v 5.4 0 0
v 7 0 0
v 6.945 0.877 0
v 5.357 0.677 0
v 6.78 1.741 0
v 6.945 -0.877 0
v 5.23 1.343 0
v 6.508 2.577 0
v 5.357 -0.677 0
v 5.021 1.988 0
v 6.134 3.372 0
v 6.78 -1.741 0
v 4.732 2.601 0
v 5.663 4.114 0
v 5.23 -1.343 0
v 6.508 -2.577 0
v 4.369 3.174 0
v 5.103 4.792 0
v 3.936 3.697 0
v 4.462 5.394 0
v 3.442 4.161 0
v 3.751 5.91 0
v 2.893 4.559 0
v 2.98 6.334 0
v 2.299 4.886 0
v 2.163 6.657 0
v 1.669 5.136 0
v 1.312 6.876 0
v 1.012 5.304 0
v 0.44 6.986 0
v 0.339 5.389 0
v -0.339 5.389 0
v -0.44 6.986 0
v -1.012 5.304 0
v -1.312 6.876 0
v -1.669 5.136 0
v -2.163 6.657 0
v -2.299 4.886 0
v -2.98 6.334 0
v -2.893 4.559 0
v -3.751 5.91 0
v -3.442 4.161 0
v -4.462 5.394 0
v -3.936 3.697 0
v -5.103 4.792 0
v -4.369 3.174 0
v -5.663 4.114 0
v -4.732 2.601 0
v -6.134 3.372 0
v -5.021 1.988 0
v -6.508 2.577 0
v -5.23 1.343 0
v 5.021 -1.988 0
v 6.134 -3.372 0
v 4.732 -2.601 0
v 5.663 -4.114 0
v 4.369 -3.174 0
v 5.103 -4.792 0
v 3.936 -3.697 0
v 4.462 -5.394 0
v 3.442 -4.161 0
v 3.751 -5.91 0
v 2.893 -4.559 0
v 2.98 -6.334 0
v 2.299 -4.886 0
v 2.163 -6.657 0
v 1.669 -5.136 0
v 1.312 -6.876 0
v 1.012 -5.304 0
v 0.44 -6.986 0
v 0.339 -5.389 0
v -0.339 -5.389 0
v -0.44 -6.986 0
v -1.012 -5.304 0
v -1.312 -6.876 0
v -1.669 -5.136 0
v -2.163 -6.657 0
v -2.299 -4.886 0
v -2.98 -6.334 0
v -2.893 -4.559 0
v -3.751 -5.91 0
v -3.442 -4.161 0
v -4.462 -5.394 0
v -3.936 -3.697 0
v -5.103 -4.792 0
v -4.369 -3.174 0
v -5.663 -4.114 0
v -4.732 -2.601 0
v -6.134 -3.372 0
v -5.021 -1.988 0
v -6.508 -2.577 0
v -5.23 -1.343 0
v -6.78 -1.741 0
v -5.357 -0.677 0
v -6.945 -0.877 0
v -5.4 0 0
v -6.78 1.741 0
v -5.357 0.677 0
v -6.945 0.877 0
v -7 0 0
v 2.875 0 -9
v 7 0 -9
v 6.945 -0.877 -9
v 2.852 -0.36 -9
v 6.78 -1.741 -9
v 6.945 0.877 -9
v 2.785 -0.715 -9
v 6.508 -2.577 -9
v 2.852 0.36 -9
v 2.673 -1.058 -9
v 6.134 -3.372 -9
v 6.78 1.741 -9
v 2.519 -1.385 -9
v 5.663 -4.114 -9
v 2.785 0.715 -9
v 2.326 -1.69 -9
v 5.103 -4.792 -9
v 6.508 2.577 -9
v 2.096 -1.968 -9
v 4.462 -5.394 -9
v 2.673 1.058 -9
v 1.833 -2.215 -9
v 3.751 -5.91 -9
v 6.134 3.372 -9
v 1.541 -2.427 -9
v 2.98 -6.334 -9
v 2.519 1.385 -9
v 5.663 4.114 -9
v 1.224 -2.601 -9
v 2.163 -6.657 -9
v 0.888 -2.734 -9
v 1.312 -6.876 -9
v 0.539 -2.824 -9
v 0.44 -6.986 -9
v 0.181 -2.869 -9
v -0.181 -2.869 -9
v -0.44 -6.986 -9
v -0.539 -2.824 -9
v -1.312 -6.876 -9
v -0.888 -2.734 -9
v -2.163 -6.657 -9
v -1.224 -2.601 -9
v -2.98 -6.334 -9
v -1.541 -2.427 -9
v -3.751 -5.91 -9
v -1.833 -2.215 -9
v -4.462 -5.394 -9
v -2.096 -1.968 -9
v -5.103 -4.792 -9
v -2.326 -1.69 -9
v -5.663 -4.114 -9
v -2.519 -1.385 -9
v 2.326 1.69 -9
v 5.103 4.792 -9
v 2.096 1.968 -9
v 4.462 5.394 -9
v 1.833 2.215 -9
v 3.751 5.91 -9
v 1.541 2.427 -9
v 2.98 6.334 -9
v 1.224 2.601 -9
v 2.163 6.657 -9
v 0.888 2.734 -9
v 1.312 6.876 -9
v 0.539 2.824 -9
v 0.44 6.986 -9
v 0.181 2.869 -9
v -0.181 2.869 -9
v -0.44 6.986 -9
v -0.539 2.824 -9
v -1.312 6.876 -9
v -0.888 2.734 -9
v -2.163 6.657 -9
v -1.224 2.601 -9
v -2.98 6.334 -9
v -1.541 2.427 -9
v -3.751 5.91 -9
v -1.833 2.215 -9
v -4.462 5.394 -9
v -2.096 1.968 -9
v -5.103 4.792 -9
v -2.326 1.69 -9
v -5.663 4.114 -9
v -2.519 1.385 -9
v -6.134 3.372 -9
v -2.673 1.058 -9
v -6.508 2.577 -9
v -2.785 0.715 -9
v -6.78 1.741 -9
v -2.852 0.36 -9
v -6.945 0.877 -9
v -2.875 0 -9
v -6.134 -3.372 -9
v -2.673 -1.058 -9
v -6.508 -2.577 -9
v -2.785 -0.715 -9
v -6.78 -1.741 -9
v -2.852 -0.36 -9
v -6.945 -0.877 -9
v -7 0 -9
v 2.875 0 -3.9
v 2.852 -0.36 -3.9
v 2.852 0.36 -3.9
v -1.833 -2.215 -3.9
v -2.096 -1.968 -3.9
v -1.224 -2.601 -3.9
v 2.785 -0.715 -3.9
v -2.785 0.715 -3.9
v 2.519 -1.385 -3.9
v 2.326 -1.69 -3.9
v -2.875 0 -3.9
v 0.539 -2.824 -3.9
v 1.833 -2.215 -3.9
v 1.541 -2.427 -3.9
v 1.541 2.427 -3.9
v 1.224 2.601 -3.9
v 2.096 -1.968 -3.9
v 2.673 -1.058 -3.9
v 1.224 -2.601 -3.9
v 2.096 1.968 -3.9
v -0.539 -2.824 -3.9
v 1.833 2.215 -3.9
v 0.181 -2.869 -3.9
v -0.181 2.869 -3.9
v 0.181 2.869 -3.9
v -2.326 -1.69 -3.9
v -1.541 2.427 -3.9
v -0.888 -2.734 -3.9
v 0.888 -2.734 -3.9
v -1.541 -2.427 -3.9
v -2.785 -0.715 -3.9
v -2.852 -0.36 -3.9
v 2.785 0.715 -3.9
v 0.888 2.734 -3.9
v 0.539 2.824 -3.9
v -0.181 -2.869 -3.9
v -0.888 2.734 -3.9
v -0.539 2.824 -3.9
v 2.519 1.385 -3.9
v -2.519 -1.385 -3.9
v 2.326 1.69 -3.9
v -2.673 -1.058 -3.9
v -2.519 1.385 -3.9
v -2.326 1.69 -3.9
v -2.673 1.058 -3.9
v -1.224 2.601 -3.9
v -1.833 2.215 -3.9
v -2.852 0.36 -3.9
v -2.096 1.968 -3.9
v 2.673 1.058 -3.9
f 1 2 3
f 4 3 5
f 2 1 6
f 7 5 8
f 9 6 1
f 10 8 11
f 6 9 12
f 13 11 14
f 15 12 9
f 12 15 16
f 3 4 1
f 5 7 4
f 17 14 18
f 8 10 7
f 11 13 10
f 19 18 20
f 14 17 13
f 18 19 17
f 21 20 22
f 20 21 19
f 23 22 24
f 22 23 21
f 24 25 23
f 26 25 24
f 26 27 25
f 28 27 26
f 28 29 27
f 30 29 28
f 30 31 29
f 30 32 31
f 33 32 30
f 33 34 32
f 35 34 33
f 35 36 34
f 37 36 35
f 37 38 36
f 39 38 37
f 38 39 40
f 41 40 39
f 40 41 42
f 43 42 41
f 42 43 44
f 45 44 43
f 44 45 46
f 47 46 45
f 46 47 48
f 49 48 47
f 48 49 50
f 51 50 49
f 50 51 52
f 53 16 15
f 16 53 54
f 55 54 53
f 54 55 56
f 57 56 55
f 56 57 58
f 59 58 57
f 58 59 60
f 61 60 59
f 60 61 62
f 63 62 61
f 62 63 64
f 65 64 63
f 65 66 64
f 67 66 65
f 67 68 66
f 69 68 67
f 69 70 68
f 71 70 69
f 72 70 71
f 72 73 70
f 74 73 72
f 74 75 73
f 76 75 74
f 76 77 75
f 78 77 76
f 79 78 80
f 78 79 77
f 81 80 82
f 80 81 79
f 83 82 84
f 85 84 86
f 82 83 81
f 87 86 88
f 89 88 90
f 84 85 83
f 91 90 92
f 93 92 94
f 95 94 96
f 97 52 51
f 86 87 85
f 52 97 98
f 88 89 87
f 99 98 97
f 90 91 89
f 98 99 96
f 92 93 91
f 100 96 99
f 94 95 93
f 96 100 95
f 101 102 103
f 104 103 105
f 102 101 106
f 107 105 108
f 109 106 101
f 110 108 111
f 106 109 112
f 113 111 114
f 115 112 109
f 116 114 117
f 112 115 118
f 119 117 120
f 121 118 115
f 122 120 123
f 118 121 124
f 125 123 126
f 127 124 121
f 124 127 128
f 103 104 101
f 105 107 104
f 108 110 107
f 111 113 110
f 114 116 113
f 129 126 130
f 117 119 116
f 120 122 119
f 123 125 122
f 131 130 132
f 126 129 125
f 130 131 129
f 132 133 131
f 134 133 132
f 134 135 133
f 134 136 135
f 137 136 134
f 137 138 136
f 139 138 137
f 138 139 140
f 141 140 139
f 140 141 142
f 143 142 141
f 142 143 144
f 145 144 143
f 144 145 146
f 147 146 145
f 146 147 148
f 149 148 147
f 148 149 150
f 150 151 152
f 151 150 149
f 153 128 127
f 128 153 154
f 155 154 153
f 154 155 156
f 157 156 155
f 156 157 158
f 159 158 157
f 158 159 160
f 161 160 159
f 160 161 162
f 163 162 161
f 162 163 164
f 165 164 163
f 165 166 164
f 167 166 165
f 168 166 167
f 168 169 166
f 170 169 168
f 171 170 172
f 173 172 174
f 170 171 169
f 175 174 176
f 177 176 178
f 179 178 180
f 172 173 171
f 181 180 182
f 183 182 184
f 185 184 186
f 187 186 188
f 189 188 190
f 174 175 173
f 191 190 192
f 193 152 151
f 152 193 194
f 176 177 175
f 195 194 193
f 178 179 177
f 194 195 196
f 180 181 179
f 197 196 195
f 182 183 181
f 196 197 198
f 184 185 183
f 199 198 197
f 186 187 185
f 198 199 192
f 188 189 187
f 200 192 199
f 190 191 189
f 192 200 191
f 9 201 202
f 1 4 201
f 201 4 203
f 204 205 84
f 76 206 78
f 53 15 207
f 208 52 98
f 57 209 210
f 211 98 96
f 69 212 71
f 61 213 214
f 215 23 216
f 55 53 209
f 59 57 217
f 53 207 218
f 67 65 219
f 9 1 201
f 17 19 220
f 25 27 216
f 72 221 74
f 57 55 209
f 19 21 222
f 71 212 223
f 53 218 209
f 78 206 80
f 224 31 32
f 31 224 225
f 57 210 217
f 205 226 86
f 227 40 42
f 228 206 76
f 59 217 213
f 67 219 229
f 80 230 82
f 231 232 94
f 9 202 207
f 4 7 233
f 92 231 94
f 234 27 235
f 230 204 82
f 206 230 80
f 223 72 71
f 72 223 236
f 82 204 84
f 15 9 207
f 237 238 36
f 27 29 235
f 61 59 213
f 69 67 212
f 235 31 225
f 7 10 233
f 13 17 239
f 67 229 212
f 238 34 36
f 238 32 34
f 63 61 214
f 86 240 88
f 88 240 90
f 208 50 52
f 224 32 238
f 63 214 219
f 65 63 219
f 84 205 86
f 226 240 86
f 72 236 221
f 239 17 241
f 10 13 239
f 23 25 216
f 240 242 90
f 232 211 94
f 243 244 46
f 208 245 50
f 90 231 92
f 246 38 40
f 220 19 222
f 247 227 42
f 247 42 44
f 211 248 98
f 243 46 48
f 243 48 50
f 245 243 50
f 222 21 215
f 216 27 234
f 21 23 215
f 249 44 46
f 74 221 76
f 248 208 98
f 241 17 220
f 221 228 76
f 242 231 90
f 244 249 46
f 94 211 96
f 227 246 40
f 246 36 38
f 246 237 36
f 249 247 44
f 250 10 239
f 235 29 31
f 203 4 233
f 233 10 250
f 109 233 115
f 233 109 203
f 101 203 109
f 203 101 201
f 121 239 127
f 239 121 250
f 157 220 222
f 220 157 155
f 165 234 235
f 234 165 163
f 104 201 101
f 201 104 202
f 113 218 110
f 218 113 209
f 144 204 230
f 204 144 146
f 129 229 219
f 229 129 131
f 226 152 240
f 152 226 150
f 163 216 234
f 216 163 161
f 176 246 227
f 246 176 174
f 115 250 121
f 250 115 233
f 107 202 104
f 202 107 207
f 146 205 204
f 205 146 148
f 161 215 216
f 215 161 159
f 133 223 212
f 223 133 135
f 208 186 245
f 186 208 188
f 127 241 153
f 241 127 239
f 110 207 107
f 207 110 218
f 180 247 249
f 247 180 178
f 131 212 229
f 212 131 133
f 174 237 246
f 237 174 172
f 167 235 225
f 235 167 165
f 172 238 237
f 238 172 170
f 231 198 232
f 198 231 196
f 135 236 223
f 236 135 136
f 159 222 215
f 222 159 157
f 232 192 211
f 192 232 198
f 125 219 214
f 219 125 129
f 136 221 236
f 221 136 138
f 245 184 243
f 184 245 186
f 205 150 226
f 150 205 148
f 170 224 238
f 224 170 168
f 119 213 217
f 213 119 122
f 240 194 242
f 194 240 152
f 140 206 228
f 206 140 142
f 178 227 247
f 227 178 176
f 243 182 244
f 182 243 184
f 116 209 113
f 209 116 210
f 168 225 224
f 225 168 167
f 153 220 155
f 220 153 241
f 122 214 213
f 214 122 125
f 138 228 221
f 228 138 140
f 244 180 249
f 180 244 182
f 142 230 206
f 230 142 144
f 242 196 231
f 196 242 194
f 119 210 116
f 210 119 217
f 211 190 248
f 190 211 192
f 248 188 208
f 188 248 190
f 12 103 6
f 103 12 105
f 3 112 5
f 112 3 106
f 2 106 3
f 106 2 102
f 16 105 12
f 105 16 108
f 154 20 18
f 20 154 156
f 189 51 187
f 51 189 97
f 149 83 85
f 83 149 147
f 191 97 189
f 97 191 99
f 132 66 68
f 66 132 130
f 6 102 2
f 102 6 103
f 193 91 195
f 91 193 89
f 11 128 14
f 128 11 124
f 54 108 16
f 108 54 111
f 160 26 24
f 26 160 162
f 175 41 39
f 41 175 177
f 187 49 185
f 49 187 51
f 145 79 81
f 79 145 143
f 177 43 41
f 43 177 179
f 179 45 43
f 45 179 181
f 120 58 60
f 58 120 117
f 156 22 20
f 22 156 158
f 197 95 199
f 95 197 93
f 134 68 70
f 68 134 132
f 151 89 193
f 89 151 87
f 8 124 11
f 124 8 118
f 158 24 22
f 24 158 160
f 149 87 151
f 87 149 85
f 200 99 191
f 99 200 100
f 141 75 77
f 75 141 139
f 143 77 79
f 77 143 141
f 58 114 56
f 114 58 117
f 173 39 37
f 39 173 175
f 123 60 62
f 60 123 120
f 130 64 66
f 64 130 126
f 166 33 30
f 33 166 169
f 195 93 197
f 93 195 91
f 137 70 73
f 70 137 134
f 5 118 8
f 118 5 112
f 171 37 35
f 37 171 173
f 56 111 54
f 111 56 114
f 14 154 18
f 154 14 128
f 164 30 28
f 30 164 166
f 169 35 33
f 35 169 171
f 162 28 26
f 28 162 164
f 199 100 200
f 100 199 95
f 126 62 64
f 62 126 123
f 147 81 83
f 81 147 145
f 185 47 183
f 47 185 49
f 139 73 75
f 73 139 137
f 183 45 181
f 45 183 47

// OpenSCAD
$fn = 50;


difference() {
	union() {
		translate(v = [0, 0, -9.0000000000]) {
			cylinder(h = 9, r = 7.0000000000);
		}
		cylinder(h = 0, r = 10.0000000000);
	}
	union() {
		translate(v = [0, 0, 0]) {
			rotate(a = [0, 0, 0]) {
				difference() {
					union() {
						#translate(v = [0, 0, -9.0000000000]) {
							cylinder(h = 9, r = 2.6000000000);
						}
						#translate(v = [0, 0, -3.9000000000]) {
							cylinder(h = 3.9000000000, r1 = 2.8750000000, r2 = 5.4000000000);
						}
						#translate(v = [0, 0, -9.0000000000]) {
							cylinder(h = 9, r = 2.8750000000);
						}
						#translate(v = [0, 0, -9.0000000000]) {
							cylinder(h = 9, r = 2.6000000000);
						}
					}
					union();
				}
			}
		}
	}
}
